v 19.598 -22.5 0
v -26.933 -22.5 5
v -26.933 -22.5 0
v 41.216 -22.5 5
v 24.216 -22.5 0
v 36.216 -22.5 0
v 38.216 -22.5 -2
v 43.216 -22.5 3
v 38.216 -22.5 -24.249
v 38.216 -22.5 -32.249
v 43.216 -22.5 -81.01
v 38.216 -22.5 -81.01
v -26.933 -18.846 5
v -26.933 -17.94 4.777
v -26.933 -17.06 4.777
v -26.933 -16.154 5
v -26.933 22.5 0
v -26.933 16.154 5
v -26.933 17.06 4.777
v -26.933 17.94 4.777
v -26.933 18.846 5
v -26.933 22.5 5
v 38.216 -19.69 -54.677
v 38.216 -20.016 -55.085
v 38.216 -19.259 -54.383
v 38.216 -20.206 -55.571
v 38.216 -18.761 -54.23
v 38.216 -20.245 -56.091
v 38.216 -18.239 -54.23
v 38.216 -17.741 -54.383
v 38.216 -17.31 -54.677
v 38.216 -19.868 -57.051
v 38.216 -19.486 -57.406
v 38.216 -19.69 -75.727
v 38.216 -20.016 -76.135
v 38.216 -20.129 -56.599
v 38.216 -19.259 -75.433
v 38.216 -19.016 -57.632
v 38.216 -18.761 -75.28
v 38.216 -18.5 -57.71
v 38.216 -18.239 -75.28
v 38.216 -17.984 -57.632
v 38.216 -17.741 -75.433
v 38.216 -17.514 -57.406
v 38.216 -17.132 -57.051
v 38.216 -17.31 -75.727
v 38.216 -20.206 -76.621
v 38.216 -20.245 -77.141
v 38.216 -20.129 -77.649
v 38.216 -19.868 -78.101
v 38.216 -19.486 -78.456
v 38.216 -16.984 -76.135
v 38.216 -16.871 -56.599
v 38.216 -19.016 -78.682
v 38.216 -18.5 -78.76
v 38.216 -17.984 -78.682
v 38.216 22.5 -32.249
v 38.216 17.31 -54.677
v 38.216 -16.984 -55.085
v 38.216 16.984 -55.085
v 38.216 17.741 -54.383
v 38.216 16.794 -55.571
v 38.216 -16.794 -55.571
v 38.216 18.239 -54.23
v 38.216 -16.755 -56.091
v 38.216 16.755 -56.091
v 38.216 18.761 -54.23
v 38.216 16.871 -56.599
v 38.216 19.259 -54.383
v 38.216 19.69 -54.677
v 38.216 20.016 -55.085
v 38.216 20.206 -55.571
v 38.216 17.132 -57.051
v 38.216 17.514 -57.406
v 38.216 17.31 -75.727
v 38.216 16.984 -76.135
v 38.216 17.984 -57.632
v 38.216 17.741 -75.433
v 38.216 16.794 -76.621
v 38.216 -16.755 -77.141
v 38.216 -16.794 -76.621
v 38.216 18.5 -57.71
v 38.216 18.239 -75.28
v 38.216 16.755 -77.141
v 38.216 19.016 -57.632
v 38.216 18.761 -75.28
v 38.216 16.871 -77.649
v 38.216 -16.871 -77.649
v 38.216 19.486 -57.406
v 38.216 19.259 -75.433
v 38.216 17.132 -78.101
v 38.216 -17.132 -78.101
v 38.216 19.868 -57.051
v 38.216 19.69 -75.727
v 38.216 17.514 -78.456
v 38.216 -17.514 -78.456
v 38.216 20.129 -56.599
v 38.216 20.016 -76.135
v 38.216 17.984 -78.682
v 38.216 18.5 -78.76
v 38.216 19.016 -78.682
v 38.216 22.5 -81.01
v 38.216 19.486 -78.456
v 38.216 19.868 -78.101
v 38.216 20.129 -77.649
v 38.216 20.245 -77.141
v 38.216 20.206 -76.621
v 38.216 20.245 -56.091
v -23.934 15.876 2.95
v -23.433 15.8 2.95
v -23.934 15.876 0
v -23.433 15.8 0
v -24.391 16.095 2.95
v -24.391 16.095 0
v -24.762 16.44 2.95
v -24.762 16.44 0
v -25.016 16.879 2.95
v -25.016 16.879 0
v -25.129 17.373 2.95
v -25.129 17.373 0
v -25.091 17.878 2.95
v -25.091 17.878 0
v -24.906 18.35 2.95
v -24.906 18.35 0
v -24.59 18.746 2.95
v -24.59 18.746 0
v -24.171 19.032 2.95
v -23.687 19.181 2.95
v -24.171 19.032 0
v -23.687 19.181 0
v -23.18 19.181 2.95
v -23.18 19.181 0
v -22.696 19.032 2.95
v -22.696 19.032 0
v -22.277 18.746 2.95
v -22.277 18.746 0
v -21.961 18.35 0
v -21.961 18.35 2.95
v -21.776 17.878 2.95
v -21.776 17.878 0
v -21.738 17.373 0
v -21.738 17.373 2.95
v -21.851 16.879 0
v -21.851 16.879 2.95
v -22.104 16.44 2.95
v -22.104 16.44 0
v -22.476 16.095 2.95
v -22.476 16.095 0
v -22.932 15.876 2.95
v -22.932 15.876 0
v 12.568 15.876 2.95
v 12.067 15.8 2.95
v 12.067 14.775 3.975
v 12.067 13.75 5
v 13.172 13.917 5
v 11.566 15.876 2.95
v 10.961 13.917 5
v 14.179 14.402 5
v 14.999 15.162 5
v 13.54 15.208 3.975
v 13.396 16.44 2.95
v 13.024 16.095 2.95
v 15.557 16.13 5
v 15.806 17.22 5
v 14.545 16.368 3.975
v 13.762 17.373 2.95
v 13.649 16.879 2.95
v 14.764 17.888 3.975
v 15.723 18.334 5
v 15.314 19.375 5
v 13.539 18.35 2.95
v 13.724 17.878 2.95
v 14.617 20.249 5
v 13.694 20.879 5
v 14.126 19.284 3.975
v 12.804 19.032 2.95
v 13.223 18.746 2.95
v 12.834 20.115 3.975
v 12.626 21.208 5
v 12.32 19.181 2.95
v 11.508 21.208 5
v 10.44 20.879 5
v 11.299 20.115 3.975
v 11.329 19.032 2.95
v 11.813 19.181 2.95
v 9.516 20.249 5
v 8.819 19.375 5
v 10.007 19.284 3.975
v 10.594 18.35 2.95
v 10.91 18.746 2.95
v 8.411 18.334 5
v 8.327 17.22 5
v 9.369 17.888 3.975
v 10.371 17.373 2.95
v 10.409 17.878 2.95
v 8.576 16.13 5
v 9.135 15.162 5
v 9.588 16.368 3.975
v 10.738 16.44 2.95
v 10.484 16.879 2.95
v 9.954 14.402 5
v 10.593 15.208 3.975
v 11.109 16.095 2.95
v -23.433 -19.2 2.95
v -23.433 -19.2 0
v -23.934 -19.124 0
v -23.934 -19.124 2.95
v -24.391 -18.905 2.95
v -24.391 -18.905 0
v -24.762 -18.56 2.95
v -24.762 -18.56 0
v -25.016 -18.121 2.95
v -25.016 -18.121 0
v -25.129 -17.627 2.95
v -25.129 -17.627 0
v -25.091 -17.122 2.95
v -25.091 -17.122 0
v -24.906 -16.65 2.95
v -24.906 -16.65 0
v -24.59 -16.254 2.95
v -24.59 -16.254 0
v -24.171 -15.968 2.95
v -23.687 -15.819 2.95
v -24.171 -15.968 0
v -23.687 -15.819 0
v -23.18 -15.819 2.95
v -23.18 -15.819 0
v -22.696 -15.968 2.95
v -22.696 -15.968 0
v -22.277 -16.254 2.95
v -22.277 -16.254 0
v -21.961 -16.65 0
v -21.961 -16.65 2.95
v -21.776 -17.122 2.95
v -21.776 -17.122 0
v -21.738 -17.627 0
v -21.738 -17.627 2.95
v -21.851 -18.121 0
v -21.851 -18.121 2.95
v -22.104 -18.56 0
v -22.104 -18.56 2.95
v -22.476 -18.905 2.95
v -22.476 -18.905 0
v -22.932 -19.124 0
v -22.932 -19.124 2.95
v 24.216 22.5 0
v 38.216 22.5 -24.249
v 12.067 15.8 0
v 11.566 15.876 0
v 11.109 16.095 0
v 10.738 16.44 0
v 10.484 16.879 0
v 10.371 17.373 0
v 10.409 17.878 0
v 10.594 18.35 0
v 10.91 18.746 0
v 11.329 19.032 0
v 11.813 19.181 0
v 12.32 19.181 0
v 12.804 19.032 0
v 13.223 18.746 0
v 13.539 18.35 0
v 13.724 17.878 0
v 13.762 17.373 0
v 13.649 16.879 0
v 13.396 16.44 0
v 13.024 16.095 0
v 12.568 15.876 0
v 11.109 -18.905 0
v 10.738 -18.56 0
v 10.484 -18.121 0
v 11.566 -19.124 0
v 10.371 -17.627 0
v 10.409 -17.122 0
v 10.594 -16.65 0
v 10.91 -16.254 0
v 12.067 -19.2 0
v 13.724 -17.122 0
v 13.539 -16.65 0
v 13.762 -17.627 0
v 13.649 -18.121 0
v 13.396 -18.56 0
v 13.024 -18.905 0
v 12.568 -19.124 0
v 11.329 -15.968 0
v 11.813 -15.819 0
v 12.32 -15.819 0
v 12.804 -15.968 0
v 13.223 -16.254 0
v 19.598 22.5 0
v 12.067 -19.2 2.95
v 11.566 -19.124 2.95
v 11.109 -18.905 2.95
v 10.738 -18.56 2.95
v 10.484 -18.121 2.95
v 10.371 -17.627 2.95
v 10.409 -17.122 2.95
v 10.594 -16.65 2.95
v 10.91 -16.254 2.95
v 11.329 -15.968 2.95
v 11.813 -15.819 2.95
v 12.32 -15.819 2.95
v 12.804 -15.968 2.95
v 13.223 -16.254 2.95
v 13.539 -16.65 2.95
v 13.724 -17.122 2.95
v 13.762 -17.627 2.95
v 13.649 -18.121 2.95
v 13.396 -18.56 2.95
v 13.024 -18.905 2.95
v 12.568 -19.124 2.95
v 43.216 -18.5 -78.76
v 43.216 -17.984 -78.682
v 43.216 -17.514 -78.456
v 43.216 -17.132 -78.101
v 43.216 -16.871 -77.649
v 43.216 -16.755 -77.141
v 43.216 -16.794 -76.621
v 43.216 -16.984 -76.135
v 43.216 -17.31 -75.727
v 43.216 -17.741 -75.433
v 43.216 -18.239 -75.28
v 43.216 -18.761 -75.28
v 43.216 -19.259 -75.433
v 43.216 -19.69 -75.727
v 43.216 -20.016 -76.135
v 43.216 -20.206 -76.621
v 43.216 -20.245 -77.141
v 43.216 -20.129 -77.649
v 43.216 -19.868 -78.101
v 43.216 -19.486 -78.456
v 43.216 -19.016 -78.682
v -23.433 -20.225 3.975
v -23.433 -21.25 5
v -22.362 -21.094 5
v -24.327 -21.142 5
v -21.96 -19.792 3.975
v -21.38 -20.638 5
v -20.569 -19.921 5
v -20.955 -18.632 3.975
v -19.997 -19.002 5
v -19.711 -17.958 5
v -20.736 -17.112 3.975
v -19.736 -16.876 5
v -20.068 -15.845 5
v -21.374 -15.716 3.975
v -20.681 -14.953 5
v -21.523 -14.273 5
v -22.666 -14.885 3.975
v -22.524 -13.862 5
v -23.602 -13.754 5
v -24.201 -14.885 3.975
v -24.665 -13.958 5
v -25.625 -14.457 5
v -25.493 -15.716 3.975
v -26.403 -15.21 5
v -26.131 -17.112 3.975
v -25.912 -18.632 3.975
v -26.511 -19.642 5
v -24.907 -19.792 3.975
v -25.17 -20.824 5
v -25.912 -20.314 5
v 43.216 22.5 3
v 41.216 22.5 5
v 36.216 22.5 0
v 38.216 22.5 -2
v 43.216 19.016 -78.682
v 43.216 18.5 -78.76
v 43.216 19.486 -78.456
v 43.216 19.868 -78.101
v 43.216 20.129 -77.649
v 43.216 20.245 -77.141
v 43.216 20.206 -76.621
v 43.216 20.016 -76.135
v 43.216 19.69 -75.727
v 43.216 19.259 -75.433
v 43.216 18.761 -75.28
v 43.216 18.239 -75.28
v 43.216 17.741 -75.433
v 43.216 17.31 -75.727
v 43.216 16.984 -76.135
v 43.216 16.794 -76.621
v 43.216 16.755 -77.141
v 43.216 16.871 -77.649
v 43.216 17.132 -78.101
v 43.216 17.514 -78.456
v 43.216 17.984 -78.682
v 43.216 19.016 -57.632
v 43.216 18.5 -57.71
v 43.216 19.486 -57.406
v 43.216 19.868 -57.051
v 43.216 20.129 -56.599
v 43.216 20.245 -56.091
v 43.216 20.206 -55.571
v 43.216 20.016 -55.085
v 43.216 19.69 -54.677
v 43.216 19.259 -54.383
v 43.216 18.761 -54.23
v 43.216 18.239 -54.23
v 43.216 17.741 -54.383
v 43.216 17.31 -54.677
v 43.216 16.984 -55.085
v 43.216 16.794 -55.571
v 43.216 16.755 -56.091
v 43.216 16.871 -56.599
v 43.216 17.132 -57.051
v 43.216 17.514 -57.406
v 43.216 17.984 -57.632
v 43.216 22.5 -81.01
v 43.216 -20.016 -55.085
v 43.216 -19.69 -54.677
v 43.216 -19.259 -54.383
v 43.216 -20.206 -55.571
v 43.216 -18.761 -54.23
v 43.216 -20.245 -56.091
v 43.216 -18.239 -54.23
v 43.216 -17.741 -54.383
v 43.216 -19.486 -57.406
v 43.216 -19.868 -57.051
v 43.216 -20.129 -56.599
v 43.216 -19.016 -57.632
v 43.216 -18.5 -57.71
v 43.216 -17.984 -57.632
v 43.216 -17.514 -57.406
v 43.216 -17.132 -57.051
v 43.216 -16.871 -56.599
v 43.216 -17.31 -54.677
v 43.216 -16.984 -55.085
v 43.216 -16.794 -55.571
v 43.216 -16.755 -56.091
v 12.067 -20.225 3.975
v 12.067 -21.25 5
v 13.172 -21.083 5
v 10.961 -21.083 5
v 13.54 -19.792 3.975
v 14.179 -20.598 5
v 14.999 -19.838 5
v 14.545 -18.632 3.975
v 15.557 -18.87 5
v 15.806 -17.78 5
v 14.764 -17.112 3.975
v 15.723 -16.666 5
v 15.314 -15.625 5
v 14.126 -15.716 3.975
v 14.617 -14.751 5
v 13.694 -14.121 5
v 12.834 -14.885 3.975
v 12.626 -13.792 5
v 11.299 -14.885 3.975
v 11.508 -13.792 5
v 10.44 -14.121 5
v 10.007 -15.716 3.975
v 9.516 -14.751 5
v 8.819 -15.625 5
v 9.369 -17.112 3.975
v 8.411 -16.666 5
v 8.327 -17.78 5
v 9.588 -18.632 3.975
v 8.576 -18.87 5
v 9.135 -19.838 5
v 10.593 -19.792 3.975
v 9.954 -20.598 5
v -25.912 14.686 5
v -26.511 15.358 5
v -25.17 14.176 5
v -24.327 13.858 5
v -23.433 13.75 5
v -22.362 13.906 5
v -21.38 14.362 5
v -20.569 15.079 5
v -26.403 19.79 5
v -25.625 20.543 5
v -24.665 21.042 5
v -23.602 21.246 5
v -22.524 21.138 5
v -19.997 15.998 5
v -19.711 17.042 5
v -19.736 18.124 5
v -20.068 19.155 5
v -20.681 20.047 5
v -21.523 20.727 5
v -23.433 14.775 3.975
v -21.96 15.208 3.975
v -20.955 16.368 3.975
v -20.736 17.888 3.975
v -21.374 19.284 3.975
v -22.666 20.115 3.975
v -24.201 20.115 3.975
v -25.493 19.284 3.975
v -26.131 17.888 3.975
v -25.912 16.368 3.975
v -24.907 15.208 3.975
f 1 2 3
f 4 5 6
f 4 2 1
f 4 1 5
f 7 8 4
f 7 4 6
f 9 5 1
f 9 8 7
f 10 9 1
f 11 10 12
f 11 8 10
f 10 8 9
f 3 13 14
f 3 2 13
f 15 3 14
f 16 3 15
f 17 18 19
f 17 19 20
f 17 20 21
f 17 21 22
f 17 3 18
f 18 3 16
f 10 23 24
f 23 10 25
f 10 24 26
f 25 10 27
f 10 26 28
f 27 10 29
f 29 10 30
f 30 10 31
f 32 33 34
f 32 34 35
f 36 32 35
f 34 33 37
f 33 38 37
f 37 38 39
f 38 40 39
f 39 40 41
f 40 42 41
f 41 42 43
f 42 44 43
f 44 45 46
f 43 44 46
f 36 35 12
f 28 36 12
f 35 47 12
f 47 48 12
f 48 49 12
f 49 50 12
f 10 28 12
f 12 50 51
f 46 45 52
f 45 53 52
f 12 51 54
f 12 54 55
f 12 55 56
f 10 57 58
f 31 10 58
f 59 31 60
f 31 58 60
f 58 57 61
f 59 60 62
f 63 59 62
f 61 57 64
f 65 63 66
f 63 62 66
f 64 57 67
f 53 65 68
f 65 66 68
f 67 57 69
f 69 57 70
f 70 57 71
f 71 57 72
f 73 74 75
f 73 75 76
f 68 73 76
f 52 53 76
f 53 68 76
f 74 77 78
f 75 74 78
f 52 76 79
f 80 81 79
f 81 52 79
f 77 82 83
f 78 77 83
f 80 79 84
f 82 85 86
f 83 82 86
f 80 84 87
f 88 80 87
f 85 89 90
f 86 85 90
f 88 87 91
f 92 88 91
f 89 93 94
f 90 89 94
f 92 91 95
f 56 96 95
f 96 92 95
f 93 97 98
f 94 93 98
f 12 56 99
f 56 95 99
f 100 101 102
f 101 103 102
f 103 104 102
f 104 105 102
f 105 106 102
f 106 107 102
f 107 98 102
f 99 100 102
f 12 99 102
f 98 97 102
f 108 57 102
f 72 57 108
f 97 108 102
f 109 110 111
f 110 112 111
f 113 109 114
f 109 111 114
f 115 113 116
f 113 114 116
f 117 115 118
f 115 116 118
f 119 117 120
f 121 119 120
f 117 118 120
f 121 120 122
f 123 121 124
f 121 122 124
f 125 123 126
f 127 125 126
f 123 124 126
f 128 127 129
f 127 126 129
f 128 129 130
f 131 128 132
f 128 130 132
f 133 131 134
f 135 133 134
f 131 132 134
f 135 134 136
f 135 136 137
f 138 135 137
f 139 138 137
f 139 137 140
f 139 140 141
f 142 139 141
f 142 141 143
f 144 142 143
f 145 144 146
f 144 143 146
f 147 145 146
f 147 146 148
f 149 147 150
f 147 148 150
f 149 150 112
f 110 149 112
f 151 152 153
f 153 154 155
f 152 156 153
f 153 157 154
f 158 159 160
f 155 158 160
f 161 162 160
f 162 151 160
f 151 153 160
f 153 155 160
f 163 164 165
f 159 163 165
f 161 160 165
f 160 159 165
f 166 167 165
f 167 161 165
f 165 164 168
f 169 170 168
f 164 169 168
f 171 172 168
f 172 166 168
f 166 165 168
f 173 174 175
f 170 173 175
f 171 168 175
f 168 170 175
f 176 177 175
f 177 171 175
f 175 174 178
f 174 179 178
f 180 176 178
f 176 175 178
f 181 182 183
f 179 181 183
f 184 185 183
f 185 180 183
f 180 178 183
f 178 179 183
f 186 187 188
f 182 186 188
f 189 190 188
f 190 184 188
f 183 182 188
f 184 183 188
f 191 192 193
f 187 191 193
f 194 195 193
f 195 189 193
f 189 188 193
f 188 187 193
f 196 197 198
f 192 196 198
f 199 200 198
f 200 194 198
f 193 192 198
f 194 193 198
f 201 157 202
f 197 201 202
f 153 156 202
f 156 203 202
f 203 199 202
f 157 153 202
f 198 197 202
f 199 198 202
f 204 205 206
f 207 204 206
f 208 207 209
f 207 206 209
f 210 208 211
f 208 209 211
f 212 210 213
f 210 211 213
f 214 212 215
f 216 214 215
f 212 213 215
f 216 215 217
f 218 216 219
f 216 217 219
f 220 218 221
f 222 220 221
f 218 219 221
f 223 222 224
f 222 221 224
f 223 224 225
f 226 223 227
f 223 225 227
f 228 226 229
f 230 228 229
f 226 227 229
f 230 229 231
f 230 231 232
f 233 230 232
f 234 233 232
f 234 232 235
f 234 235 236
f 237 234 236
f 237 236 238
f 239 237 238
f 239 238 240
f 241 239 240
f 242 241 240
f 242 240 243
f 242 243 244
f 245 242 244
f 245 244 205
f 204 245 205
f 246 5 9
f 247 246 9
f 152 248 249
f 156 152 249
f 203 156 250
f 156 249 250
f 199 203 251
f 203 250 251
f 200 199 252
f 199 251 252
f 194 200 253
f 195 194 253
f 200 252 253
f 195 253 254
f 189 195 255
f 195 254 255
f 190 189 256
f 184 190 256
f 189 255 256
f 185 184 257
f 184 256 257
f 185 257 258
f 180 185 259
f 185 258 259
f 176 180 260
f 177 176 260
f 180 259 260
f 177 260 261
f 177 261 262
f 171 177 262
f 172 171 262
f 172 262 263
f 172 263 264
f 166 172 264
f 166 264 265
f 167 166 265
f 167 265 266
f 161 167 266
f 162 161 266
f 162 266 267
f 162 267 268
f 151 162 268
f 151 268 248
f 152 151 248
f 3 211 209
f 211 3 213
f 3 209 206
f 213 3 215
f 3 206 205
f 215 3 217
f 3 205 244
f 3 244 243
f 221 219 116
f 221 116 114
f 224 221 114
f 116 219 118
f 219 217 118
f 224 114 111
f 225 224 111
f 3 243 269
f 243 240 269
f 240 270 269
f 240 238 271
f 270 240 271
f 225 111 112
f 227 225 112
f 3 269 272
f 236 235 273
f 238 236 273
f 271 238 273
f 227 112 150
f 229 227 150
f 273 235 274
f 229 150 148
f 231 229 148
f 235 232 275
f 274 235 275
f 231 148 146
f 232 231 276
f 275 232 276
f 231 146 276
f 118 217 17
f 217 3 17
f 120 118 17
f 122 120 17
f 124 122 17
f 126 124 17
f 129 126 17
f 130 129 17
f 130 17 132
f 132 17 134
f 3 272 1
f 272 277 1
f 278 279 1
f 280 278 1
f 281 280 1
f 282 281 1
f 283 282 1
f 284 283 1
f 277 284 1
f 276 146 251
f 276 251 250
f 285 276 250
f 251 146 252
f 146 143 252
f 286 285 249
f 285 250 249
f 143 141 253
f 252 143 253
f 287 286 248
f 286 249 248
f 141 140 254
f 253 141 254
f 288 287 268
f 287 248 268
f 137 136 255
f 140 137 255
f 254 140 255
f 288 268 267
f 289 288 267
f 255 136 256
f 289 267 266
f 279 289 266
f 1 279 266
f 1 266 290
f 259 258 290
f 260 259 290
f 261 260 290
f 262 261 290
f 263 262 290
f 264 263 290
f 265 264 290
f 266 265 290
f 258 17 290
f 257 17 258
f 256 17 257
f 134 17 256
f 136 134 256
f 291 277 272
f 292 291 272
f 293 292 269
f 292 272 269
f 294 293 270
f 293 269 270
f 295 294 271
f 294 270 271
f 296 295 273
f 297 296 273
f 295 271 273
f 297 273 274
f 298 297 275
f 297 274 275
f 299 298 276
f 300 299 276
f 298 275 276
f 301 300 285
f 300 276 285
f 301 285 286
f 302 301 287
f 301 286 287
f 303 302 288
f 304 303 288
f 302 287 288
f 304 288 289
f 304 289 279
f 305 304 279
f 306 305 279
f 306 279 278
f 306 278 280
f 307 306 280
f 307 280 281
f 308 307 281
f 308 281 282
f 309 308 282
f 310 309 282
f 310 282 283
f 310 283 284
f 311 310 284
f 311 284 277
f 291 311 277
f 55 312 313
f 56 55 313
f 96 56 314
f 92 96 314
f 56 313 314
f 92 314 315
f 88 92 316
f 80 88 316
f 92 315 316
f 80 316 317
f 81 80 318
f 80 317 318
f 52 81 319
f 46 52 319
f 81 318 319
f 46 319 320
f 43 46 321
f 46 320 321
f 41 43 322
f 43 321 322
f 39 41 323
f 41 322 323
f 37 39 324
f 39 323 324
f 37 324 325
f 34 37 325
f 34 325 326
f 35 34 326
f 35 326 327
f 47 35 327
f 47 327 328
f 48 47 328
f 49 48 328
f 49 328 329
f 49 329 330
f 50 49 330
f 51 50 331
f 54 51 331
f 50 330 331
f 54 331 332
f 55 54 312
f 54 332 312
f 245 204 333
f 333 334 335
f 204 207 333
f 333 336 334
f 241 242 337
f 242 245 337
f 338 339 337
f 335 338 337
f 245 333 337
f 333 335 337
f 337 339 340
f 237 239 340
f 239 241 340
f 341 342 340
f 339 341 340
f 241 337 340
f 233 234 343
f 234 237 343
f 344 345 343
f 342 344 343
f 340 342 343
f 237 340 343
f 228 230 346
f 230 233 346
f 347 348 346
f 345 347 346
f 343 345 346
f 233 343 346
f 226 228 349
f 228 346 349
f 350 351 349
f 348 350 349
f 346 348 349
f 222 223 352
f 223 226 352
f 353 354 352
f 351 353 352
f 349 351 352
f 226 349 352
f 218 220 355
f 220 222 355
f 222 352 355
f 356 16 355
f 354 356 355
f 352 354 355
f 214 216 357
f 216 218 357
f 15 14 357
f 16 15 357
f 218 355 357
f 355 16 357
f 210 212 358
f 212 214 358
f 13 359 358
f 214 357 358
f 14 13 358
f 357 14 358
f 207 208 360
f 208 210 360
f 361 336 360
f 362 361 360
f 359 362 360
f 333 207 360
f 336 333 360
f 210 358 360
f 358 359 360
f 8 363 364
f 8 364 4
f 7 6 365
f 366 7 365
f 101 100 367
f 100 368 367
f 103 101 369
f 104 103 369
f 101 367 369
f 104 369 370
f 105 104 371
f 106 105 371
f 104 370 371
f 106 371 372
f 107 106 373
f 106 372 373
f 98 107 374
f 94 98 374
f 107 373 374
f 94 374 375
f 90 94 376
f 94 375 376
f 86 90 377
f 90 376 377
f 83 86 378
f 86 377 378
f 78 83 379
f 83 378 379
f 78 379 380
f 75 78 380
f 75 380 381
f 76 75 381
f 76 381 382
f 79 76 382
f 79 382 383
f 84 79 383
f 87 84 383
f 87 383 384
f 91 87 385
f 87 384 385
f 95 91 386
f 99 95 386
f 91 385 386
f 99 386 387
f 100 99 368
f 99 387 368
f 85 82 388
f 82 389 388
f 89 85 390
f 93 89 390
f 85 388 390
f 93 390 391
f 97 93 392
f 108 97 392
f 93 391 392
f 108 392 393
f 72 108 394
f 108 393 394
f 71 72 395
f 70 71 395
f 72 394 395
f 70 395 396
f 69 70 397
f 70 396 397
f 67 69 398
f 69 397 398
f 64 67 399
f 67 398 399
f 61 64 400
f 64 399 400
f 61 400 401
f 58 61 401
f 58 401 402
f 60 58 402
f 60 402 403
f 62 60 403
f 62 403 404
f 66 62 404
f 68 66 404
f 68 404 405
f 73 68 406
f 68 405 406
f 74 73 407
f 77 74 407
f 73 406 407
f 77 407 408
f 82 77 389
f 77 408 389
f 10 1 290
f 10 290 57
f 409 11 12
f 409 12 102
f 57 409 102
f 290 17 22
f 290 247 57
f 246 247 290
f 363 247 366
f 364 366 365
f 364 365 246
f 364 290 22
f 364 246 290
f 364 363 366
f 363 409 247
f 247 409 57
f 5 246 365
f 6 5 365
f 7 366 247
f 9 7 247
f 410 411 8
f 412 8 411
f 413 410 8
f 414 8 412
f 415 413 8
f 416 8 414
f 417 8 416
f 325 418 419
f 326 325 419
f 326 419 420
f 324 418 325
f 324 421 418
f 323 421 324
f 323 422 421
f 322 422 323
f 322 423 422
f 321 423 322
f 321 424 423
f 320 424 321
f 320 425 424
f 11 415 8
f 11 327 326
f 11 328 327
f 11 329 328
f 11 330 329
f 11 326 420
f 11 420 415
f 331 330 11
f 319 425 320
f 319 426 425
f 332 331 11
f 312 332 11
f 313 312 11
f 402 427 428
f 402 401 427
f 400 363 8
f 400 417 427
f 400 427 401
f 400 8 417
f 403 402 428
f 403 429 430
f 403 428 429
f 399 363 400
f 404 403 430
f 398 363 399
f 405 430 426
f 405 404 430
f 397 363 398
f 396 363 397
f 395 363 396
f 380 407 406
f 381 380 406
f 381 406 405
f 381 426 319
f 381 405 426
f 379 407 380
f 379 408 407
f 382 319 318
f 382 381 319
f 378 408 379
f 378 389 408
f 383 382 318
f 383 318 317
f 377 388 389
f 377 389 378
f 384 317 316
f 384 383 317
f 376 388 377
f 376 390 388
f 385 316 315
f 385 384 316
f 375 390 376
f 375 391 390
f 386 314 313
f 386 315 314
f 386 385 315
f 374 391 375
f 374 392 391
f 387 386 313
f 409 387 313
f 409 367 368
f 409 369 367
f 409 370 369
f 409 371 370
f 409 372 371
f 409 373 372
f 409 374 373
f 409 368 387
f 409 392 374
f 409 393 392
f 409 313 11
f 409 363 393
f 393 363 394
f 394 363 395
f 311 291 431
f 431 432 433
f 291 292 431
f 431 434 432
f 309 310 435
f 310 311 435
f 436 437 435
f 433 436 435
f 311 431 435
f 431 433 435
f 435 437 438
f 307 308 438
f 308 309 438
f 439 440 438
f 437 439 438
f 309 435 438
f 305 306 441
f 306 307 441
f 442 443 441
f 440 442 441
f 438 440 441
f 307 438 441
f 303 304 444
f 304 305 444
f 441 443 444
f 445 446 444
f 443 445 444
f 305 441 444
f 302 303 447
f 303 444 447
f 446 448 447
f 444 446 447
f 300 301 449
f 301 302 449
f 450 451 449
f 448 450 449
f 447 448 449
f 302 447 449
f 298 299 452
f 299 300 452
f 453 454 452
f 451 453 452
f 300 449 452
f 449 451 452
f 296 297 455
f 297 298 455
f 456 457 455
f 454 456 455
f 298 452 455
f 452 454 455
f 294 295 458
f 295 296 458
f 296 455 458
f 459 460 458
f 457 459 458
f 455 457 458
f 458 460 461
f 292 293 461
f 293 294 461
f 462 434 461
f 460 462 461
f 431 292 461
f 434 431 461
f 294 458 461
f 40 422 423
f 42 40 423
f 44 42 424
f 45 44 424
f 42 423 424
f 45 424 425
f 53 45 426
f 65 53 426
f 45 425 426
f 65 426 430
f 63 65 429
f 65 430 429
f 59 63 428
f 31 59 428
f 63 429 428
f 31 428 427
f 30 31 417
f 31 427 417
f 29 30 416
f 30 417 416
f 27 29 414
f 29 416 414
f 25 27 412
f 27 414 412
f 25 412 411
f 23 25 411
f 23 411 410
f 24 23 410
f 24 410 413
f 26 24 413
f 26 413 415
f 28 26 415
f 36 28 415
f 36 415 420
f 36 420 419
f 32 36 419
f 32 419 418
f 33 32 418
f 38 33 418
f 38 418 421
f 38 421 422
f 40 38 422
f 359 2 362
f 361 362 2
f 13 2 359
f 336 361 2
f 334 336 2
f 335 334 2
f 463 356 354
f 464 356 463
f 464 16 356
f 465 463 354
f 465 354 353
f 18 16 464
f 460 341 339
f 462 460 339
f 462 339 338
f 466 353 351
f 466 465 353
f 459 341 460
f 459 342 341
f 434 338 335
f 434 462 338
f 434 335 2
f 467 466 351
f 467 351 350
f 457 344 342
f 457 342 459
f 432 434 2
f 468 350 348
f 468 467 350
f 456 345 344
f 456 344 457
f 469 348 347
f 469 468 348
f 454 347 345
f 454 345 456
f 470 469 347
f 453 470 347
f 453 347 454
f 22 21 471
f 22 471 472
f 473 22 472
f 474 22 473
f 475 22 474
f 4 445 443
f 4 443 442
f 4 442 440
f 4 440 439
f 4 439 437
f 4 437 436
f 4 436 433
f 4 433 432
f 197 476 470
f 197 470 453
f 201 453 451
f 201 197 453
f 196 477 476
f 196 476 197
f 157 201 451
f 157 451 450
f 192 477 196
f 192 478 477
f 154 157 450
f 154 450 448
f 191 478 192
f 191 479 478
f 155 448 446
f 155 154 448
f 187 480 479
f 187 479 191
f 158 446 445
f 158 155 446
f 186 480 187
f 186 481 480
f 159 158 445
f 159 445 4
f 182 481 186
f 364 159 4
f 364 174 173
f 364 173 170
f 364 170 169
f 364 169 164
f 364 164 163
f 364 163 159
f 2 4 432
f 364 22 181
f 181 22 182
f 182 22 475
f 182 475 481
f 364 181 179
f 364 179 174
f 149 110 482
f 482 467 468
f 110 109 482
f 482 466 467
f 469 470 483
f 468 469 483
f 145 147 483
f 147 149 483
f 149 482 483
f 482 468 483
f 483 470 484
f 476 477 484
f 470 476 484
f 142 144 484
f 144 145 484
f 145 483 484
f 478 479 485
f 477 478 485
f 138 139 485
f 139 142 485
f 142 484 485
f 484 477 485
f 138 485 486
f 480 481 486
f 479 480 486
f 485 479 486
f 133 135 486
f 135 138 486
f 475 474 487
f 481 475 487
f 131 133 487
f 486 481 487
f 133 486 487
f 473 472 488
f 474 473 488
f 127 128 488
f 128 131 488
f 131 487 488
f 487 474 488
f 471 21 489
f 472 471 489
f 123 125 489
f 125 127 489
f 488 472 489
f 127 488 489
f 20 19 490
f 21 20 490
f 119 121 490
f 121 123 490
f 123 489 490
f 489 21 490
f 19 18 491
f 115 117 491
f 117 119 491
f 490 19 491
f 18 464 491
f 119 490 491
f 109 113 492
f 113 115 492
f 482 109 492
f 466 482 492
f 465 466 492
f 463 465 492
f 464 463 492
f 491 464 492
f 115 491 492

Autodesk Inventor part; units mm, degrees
ref_plane "YZ Plane" through (0, 0, 0) normal (1, 0, 0) x (0, 1, 0)
ref_plane "XZ Plane" through (0, 0, 0) normal (0, 1, 0) x (-1, 0, 0)
ref_plane "XY Plane" through (0, 0, 0) normal (0, 0, 1) x (1, 0, 0)
sketch "Skizze1" plane through (0, 0, 0) normal (0, 0, 1) x (1, 0, 0)
  circle A0 centre (12.0667, -17.5) radius 2 projected
  circle A1 centre (12.0667, 17.5) radius 2 projected
  line L0 (17.0667, 22.5) -> (17.0667, -22.5) projected
  line L1 (7.0667, 22.5) -> (17.0667, 22.5) projected
  line L2 (7.0667, -22.5) -> (7.0667, 22.5) projected
  line L3 (17.0667, -22.5) -> (7.0667, -22.5) projected
  circle A2 centre (-23.4333, -17.5) radius 2 projected
  circle A3 centre (-23.4333, 17.5) radius 2 projected
  line L4 (-19.9333, 22.5) -> (-19.9333, -22.5) projected
  line L5 (-26.9333, 22.5) -> (-19.9333, 22.5) projected
  line L6 (-26.9333, -22.5) -> (-26.9333, 22.5) projected
  line L7 (-19.9333, -22.5) -> (-26.9333, -22.5) projected
  line L8 (43.2163, 19.557) -> (43.2163, 16.9277) projected
  line L9 (43.2163, -19.557) -> (43.2163, -16.9277) projected
  line L10 (43.2163, -20.3) -> (43.2163, -16.7) projected
  line L11 (43.2163, 20.3) -> (43.2163, 16.7) projected
  line L12 (-26.9333, 22.5) -> (43.2163, 22.5)
  line L13 (43.2163, 22.5) -> (43.2163, -22.5)
  line L14 (43.2163, -22.5) -> (-26.9333, -22.5)
  line L15 (-26.9333, -22.5) -> (-26.9333, 22.5)
  point P0 (0, 0)
extrude "Extrusion1" add sketch "Skizze1" along normal blind 5 contours A0 | A1 | L12 L13 L11 L8 L10 L9 L14 L0 | L0 L3 L2 L1 | L2 L14 L4 L12 | L4 L7 L6 L5 | A2 | A3
sketch "Skizze2" plane through (43.2163, -22.5, 0) normal (1, 0, 0) x (0, 0, -1)
  line L0 (0, 0) -> (-5, 0) projected
  line L1 (0, 0) -> (81.01, 0)
  line L2 (81.01, 0) -> (81.01, 45)
  line L3 (81.01, 45) -> (0, 45)
  line L4 (0, 45) -> (0, 0)
  circle A0 centre (77.01, 41) radius 1.8 construction
  circle A1 centre (77.01, 4) radius 1.8 construction
  arc A2 (54.796, 42.057) -> (57.124, 42.057) centre (55.96, 41) ccw construction
  arc A3 (57.124, 2.943) -> (54.796, 2.943) centre (55.96, 4) ccw construction
  circle A4 centre (55.96, 41) radius 1.75
  circle A5 centre (55.96, 4) radius 1.75
  circle A6 centre (77.01, 41) radius 1.75
  circle A7 centre (77.01, 4) radius 1.75
  point P0 (0, 22.5)
  dimension "d2" = 4
  dimension "d5" = 3.5
  dimension "d6" = 3.5
  dimension "d7" = 3.5
  dimension "d8" = 3.5
extrude "Extrusion2" add sketch "Skizze2" against normal blind 5
sketch "Skizze3" plane through (-26.9333, -22.5, 5) normal (0, -1, 0) x (1, 0, 0)
  line L0 (0, -5) -> (65.1497, -5) projected
  line L1 (31.7157, -5) -> (77.2703, -5) construction
  line L2 (65.1497, -86.01) -> (65.1497, -5) projected
  line L3 (51.1497, -5) -> (65.1497, -29.2487)
  line L4 (51.1497, -5) -> (79.1497, -5) construction
  line L5 (46.5308, -5) -> (65.1497, -37.2487)
  point P0 (26.9333, -5)
  dimension "d11" = 60
  dimension "d12" = 14
  dimension "d13" = 4
extrude "Extrusion3" add sketch "Skizze3" against normal up to surface (45 mm away) contours L0 L3 L2 L5
chamfer "Fasen1" distance 2 angle 45 2 edges at (38.2163, 0, 0) (43.2163, 0, 5)
sketch "Skizze4" plane through (0, 0, 5) normal (0, 0, 1) x (1, 0, 0)
  circle A0 centre (12.0667, 17.5) radius 2 projected
  circle A1 centre (12.0667, -17.5) radius 2 projected
  circle A2 centre (-23.4333, -17.5) radius 2 projected
  circle A3 centre (-23.4333, 17.5) radius 2 projected
  point P0 (0, 0)
hole "Bohrung1" at (12.0667, 17.5, 5) at (12.0667, -17.5, 5) at (-23.4333, -17.5, 5) at (-23.4333, 17.5, 5) direction (0, 0, -1) diameter 3.4 depth 8 countersink diameter 7.5 countersink angle 90 clearance for "Innensechskant-Senkkopfschraube DIN EN ISO 10642" size "M3" standard "DIN"
properties part number "Kameraturm_Cognex_Halter"
